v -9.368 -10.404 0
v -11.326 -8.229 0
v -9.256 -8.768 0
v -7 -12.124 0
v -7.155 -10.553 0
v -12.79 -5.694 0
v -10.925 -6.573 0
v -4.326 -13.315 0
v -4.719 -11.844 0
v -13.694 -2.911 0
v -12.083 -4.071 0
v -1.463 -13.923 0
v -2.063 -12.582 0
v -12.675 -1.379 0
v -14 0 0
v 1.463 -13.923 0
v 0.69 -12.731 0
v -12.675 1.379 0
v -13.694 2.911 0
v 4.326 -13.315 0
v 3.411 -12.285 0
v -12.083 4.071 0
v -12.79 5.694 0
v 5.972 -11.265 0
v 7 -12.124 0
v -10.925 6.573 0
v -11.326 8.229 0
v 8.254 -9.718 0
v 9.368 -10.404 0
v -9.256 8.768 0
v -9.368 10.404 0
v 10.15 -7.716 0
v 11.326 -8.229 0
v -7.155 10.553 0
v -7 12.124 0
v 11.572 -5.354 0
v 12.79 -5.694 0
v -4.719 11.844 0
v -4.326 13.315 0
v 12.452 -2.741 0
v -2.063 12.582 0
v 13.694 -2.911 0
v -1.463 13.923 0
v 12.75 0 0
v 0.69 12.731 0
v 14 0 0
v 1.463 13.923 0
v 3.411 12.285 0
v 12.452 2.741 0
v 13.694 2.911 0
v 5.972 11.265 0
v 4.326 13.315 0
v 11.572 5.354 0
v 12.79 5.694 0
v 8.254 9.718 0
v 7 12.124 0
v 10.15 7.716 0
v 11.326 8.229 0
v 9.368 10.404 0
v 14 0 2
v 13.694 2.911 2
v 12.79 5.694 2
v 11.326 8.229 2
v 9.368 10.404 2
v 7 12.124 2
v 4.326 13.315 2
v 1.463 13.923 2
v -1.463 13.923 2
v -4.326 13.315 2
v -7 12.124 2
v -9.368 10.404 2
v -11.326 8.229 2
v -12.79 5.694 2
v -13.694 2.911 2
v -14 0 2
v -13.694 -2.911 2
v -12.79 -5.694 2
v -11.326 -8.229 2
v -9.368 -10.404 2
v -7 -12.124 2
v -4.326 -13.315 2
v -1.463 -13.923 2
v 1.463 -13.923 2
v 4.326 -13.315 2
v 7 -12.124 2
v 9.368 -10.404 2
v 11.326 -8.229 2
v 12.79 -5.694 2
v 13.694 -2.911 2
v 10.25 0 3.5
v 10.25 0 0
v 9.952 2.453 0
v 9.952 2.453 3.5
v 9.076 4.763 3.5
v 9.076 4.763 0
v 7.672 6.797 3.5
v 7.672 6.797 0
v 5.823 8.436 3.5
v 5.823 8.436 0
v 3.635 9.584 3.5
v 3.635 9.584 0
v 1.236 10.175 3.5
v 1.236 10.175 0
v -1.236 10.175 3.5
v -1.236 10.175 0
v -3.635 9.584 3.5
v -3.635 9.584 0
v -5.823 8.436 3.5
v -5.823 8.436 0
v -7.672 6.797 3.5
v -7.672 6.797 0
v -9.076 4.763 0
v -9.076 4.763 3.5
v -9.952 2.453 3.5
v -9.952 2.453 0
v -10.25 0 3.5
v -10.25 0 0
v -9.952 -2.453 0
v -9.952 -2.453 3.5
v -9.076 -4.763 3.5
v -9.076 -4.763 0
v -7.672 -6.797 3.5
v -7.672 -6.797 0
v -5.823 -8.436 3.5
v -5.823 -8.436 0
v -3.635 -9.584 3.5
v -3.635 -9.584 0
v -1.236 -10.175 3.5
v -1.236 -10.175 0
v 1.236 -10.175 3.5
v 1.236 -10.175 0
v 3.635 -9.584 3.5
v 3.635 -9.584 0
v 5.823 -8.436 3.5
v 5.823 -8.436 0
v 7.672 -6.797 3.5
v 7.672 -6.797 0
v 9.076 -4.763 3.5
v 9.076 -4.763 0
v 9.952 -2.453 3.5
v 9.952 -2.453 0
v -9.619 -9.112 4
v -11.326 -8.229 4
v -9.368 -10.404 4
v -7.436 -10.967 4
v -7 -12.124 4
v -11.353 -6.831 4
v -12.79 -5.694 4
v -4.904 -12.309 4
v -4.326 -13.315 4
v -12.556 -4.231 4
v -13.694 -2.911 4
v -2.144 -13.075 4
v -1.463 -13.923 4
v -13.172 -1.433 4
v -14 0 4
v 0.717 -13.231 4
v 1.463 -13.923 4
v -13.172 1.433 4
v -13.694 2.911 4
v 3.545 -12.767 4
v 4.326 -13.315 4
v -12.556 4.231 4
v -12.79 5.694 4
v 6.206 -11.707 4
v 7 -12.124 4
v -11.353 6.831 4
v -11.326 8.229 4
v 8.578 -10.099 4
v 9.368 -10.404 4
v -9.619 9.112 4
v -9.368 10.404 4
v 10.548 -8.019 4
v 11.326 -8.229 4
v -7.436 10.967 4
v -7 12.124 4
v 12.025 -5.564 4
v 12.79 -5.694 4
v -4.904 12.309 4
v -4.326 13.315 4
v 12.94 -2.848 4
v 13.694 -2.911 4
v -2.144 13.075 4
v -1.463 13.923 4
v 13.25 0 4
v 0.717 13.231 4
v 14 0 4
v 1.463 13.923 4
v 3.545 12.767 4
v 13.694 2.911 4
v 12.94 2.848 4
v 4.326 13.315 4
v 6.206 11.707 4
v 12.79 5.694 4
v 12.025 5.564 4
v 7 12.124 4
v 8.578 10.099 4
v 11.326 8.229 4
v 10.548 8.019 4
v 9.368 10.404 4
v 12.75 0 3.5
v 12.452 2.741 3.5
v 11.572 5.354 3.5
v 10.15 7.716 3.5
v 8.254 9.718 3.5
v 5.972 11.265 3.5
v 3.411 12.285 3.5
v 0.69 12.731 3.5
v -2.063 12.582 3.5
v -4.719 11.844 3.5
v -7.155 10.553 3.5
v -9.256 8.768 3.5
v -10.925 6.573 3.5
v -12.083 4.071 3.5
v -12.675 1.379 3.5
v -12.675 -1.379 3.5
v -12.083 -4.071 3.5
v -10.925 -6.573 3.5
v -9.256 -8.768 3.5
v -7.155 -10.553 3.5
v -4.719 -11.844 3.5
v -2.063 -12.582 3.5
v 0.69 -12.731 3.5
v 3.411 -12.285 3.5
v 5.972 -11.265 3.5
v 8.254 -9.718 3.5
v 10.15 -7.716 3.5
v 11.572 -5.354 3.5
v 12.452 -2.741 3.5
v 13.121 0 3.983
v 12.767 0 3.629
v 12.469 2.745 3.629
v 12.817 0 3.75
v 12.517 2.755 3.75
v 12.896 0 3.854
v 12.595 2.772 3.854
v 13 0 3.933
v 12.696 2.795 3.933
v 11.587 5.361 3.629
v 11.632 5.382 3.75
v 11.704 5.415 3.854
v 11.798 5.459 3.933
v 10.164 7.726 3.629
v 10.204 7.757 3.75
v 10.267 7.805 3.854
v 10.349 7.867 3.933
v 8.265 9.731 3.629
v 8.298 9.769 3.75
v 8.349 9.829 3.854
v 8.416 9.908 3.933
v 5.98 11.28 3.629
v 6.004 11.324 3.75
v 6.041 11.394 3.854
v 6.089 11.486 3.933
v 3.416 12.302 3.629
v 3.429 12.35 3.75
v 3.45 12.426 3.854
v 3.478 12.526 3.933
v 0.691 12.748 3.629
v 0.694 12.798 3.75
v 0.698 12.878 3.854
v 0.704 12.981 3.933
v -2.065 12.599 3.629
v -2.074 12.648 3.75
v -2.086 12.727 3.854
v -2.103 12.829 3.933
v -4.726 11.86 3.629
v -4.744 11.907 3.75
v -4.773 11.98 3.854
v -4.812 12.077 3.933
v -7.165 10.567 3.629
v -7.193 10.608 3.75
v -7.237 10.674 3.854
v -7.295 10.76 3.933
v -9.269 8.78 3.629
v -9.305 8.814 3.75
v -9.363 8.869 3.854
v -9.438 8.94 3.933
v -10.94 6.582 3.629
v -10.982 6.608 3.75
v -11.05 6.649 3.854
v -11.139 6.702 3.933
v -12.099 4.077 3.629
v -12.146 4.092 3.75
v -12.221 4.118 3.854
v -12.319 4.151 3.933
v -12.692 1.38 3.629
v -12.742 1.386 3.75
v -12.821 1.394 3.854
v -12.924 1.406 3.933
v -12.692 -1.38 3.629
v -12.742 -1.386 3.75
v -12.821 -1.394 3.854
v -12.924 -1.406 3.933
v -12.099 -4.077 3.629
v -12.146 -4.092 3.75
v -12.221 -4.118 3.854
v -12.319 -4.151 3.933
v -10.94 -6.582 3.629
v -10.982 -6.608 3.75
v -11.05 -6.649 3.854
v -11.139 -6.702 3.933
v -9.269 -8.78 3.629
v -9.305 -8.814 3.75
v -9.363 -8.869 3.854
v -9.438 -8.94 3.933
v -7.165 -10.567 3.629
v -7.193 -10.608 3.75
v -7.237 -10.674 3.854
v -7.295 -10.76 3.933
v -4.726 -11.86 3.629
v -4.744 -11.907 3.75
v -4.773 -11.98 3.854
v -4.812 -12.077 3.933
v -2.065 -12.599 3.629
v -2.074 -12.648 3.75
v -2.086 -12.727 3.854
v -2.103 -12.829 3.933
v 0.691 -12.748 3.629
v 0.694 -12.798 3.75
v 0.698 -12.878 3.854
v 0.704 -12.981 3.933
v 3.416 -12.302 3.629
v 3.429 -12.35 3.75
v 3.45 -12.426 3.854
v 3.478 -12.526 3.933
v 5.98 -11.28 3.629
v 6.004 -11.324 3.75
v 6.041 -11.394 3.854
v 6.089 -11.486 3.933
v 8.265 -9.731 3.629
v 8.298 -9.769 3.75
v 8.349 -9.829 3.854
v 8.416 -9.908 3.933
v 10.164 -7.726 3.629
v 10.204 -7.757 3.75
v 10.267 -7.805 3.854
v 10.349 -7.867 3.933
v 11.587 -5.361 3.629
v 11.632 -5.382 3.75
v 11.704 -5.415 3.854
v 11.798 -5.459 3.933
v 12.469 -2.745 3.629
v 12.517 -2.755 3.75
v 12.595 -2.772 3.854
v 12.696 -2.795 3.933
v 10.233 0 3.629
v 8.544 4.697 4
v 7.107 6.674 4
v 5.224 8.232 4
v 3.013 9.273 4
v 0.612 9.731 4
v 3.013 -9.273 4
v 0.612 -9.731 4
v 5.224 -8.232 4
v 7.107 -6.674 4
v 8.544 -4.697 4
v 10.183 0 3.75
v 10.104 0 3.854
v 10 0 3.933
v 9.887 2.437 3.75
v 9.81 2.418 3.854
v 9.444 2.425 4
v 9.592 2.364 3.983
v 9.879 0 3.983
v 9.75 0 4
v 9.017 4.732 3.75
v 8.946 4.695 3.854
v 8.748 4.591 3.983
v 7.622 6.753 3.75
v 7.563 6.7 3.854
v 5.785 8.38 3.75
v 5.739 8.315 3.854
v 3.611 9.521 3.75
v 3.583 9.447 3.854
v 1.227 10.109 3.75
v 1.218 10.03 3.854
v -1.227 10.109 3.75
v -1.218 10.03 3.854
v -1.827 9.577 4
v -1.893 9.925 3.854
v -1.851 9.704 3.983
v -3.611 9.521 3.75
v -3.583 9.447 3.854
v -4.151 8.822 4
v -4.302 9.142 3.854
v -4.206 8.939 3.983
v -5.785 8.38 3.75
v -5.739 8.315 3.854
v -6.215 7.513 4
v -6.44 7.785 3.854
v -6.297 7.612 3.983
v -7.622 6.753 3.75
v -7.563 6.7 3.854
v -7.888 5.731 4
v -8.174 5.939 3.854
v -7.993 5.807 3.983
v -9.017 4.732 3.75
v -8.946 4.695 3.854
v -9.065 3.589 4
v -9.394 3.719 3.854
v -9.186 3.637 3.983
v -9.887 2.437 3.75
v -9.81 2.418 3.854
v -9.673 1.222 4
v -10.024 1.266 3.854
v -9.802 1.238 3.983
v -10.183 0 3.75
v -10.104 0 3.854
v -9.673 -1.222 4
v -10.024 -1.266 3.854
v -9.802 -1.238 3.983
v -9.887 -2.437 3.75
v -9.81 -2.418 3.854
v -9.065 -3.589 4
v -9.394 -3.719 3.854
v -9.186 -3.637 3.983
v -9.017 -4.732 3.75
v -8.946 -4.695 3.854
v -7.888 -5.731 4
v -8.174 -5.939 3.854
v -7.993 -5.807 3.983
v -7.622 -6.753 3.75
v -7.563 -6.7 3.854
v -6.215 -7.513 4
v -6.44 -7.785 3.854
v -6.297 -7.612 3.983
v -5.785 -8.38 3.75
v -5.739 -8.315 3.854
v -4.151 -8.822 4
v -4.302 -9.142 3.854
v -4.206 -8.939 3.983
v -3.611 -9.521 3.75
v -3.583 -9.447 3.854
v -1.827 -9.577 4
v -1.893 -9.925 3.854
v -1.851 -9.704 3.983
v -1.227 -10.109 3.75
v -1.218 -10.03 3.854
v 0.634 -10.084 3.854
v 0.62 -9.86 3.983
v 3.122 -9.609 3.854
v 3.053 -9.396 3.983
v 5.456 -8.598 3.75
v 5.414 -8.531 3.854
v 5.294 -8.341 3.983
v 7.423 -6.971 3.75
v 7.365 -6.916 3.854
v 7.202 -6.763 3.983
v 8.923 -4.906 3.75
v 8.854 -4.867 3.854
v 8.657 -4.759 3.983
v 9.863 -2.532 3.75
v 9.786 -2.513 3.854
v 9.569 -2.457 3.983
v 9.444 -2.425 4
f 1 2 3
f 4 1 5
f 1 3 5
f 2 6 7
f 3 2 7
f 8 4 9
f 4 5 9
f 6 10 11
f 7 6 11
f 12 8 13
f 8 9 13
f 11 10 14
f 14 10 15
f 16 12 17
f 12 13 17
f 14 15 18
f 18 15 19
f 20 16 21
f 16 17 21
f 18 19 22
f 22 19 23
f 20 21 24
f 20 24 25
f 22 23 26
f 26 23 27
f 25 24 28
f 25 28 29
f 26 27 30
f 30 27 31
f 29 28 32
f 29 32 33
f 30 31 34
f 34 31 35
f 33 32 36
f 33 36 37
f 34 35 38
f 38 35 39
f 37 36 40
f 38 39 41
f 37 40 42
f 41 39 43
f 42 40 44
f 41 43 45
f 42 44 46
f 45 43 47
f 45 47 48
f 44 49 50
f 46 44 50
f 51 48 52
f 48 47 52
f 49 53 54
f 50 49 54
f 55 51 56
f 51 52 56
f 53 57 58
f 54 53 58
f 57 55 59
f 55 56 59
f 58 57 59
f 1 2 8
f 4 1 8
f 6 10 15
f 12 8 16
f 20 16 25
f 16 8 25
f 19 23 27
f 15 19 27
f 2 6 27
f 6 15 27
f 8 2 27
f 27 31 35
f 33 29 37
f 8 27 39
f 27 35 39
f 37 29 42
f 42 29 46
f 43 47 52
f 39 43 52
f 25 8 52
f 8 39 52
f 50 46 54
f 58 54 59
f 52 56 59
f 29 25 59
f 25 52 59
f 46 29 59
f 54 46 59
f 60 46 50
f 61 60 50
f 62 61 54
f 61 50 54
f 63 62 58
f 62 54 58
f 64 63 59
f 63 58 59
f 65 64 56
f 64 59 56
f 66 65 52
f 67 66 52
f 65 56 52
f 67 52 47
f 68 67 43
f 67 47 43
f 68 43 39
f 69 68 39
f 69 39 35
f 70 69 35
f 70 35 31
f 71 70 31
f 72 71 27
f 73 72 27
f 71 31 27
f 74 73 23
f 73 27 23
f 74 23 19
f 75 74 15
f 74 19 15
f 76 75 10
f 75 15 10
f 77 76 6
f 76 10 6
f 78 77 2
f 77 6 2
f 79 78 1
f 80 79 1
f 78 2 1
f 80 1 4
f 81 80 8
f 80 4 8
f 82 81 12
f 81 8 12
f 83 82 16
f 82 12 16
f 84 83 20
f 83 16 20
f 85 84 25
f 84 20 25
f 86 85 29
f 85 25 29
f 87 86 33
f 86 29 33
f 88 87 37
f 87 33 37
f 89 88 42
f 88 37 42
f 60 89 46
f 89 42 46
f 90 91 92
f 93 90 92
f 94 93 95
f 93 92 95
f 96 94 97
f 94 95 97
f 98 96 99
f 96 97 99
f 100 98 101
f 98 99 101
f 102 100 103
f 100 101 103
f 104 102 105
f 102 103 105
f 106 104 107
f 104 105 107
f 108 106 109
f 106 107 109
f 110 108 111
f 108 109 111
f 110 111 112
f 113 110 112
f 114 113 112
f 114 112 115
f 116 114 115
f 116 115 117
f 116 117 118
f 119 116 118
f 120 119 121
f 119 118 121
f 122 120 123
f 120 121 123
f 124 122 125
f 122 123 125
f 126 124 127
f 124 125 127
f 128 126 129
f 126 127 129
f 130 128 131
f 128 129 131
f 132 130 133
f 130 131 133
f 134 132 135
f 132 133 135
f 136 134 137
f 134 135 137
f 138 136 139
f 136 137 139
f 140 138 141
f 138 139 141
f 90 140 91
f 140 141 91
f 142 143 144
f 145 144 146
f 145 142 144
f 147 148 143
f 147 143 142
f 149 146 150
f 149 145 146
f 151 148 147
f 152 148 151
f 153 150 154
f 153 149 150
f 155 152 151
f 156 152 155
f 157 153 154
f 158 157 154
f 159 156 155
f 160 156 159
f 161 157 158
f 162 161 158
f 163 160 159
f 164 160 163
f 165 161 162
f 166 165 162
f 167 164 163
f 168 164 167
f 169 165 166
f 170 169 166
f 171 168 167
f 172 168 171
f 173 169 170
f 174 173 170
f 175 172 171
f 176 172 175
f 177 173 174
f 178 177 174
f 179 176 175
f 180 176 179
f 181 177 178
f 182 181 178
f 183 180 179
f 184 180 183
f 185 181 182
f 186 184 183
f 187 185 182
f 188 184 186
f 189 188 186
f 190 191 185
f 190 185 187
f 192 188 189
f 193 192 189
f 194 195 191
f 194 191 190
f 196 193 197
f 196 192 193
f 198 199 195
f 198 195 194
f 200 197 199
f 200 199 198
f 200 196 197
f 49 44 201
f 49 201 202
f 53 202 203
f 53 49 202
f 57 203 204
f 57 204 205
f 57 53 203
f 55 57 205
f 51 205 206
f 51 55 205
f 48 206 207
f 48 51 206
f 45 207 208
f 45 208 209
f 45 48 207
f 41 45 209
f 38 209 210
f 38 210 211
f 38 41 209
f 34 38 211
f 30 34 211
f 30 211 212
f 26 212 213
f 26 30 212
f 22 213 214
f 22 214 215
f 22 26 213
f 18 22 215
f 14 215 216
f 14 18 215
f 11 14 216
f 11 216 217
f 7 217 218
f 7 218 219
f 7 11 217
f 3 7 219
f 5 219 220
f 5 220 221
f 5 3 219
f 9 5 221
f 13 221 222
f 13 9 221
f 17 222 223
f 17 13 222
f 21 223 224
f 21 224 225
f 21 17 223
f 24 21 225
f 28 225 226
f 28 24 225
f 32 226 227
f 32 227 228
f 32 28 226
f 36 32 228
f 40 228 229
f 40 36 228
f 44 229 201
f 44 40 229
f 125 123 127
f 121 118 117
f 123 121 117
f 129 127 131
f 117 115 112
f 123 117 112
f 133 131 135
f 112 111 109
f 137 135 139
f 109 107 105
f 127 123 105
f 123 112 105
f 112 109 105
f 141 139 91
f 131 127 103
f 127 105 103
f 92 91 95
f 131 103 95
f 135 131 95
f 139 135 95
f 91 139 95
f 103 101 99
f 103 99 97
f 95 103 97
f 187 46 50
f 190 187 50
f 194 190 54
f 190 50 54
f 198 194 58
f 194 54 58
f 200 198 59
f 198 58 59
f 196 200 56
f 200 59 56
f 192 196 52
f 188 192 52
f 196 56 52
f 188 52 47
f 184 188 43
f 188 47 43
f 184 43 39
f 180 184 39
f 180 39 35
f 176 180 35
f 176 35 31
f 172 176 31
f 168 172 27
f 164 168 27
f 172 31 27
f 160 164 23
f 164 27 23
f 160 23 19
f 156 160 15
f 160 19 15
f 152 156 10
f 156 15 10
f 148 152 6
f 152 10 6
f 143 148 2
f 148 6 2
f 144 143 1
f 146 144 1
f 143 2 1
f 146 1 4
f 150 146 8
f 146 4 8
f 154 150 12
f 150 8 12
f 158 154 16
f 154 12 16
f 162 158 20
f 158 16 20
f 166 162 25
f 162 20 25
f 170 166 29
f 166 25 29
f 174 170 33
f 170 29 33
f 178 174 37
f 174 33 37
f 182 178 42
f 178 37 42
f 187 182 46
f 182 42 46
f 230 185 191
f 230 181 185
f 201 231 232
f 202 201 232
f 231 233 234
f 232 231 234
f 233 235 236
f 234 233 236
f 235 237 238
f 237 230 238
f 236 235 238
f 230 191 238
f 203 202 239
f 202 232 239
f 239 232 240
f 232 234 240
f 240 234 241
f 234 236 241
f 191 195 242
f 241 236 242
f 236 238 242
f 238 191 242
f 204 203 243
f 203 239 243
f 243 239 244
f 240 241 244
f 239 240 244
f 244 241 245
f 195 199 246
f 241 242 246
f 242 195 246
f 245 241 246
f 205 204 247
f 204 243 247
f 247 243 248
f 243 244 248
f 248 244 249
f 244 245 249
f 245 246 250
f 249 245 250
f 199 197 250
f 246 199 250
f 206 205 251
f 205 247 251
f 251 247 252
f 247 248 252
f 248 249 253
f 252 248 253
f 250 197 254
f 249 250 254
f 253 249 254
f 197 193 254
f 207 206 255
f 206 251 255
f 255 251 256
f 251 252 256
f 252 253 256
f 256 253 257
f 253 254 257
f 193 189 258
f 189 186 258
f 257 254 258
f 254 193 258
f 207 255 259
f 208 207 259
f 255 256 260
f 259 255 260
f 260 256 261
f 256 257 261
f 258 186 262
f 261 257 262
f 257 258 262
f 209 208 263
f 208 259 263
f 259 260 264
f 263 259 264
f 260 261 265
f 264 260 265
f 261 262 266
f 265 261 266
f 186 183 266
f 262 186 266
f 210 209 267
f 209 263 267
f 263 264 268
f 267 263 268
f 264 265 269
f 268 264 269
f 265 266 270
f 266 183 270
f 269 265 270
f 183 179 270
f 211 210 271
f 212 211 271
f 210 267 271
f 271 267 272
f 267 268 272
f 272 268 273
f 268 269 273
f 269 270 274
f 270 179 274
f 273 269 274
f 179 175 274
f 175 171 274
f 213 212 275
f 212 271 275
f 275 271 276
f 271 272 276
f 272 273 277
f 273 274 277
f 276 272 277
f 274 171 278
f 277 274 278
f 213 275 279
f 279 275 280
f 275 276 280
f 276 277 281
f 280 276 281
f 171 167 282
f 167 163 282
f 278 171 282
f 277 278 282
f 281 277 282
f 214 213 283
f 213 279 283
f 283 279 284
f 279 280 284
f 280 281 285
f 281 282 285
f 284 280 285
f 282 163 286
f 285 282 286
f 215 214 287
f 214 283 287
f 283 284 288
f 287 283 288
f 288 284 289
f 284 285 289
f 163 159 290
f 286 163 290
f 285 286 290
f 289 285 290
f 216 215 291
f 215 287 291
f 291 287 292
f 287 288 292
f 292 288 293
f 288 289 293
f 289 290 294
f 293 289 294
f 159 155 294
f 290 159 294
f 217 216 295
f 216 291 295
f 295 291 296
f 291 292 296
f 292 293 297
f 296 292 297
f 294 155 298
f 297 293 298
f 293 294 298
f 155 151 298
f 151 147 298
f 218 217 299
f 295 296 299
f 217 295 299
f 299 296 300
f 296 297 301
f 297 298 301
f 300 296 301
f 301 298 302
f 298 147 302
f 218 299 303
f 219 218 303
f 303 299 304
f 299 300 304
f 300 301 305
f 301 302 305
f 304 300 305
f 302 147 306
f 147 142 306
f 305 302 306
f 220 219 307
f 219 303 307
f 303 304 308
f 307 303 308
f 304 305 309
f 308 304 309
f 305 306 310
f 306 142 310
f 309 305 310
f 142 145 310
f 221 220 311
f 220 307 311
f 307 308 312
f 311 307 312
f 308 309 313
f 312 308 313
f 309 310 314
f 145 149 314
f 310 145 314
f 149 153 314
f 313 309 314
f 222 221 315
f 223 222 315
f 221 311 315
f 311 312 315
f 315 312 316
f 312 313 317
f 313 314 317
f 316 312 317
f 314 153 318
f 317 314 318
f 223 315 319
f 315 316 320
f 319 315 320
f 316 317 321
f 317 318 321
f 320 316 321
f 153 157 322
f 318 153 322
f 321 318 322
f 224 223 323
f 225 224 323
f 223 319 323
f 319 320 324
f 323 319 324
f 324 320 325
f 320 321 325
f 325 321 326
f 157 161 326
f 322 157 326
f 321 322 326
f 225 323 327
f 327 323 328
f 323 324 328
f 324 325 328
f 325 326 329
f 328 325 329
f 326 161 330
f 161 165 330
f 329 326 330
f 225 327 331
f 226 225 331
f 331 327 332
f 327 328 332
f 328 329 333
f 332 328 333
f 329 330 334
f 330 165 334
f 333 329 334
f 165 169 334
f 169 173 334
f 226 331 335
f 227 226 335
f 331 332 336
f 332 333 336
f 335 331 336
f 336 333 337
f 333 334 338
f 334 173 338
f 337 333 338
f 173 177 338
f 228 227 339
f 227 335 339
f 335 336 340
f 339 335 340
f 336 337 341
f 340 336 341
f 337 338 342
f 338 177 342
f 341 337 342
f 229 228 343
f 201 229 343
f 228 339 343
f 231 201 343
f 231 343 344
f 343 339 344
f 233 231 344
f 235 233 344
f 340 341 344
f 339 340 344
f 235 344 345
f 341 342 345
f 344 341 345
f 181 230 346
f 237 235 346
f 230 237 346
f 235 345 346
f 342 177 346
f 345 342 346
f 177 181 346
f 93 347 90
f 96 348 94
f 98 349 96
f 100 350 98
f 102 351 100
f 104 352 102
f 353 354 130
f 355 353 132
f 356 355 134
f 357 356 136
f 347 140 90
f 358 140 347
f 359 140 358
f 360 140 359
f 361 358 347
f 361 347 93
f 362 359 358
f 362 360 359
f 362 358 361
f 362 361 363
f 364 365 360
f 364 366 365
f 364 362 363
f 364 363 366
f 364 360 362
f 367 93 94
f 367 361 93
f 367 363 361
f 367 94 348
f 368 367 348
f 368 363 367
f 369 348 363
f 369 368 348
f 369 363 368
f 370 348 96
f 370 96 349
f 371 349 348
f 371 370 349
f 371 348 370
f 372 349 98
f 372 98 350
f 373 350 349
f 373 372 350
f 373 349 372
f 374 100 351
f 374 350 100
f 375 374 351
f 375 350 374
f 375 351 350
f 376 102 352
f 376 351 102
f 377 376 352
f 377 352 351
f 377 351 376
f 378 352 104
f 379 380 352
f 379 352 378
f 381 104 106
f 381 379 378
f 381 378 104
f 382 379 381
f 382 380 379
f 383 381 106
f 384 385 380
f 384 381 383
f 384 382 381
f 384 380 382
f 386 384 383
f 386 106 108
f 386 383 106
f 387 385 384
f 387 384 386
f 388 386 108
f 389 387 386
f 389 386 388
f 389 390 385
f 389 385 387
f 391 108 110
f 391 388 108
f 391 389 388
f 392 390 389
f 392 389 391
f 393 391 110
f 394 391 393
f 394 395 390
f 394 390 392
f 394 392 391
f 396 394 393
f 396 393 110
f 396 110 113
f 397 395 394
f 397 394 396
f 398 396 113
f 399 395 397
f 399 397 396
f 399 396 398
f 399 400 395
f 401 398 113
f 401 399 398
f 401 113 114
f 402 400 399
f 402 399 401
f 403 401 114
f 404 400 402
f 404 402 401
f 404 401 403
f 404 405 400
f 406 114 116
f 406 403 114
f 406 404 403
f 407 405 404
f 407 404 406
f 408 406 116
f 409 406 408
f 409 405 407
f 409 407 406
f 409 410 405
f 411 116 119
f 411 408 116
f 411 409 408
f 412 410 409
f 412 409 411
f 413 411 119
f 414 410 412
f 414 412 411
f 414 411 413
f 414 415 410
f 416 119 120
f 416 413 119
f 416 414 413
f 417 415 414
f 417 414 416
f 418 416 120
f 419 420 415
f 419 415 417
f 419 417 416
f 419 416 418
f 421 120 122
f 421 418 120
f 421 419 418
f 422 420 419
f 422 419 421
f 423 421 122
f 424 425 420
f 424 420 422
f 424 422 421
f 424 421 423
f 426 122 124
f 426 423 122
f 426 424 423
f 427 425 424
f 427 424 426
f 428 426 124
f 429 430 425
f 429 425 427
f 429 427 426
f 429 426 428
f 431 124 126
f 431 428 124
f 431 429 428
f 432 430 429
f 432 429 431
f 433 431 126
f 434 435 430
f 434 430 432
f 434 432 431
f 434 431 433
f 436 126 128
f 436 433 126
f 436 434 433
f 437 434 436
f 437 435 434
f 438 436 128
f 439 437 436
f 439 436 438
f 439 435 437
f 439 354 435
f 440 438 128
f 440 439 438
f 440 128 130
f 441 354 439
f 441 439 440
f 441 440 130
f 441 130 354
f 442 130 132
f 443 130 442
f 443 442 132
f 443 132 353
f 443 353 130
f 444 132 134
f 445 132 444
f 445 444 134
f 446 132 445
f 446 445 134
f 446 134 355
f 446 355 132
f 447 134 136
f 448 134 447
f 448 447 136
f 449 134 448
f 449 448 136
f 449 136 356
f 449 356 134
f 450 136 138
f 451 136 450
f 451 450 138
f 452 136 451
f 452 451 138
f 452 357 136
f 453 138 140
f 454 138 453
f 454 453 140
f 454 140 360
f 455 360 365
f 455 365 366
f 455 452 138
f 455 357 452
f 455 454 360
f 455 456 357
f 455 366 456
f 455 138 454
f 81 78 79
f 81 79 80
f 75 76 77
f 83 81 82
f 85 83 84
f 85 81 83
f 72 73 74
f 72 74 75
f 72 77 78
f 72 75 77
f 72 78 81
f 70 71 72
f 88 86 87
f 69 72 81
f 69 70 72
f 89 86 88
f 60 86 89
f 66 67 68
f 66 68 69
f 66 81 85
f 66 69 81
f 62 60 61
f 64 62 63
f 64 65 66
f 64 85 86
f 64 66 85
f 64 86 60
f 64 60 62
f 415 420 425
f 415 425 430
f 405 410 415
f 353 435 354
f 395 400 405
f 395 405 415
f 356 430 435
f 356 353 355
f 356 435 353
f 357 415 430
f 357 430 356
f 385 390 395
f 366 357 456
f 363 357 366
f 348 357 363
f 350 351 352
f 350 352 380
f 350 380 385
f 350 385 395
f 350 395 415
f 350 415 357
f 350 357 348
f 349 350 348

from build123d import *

# Parameters (mm, degrees)
F0_R     = 14
F0_R_2   = 12.75
F0_R_3   = 10.25
F1_DEPTH = 2
F2_DEPTH = 4
F3_R     = 0.5
F4_R     = 0.5


with BuildPart() as f1:
    # F0 (on Top) → F1 (new body)
    with BuildSketch(Plane.XY):
        Circle(F0_R)
        Circle(F0_R_2, mode=Mode.SUBTRACT)
        Circle(F0_R_2)
        Circle(F0_R_3, mode=Mode.SUBTRACT)
        Circle(F0_R_3)
    extrude(amount=F1_DEPTH)


with BuildPart() as f2:
    # F0 (on Top) → F2 (new body)
    with BuildSketch(Plane.XY):
        Circle(F0_R)
        Circle(F0_R_2, mode=Mode.SUBTRACT)
    extrude(amount=F2_DEPTH)

    # F4
    f4_edges = [f2.edges().sort_by_distance(p)[0] for p in [
        (-12.75, 0, 4),
    ]]
    fillet(f4_edges, radius=F4_R)


with BuildPart() as f2b:
    # F0 (on Top) → F2, piece 2 (new body)
    with BuildSketch(Plane.XY):
        Circle(F0_R_3)
    extrude(amount=F2_DEPTH)

    # F3
    f3_edges = [f2b.edges().sort_by_distance(p)[0] for p in [
        (-10.25, 0, 4),
    ]]
    fillet(f3_edges, radius=F3_R)


solid = Compound([f1.part, f2.part, f2b.part])
